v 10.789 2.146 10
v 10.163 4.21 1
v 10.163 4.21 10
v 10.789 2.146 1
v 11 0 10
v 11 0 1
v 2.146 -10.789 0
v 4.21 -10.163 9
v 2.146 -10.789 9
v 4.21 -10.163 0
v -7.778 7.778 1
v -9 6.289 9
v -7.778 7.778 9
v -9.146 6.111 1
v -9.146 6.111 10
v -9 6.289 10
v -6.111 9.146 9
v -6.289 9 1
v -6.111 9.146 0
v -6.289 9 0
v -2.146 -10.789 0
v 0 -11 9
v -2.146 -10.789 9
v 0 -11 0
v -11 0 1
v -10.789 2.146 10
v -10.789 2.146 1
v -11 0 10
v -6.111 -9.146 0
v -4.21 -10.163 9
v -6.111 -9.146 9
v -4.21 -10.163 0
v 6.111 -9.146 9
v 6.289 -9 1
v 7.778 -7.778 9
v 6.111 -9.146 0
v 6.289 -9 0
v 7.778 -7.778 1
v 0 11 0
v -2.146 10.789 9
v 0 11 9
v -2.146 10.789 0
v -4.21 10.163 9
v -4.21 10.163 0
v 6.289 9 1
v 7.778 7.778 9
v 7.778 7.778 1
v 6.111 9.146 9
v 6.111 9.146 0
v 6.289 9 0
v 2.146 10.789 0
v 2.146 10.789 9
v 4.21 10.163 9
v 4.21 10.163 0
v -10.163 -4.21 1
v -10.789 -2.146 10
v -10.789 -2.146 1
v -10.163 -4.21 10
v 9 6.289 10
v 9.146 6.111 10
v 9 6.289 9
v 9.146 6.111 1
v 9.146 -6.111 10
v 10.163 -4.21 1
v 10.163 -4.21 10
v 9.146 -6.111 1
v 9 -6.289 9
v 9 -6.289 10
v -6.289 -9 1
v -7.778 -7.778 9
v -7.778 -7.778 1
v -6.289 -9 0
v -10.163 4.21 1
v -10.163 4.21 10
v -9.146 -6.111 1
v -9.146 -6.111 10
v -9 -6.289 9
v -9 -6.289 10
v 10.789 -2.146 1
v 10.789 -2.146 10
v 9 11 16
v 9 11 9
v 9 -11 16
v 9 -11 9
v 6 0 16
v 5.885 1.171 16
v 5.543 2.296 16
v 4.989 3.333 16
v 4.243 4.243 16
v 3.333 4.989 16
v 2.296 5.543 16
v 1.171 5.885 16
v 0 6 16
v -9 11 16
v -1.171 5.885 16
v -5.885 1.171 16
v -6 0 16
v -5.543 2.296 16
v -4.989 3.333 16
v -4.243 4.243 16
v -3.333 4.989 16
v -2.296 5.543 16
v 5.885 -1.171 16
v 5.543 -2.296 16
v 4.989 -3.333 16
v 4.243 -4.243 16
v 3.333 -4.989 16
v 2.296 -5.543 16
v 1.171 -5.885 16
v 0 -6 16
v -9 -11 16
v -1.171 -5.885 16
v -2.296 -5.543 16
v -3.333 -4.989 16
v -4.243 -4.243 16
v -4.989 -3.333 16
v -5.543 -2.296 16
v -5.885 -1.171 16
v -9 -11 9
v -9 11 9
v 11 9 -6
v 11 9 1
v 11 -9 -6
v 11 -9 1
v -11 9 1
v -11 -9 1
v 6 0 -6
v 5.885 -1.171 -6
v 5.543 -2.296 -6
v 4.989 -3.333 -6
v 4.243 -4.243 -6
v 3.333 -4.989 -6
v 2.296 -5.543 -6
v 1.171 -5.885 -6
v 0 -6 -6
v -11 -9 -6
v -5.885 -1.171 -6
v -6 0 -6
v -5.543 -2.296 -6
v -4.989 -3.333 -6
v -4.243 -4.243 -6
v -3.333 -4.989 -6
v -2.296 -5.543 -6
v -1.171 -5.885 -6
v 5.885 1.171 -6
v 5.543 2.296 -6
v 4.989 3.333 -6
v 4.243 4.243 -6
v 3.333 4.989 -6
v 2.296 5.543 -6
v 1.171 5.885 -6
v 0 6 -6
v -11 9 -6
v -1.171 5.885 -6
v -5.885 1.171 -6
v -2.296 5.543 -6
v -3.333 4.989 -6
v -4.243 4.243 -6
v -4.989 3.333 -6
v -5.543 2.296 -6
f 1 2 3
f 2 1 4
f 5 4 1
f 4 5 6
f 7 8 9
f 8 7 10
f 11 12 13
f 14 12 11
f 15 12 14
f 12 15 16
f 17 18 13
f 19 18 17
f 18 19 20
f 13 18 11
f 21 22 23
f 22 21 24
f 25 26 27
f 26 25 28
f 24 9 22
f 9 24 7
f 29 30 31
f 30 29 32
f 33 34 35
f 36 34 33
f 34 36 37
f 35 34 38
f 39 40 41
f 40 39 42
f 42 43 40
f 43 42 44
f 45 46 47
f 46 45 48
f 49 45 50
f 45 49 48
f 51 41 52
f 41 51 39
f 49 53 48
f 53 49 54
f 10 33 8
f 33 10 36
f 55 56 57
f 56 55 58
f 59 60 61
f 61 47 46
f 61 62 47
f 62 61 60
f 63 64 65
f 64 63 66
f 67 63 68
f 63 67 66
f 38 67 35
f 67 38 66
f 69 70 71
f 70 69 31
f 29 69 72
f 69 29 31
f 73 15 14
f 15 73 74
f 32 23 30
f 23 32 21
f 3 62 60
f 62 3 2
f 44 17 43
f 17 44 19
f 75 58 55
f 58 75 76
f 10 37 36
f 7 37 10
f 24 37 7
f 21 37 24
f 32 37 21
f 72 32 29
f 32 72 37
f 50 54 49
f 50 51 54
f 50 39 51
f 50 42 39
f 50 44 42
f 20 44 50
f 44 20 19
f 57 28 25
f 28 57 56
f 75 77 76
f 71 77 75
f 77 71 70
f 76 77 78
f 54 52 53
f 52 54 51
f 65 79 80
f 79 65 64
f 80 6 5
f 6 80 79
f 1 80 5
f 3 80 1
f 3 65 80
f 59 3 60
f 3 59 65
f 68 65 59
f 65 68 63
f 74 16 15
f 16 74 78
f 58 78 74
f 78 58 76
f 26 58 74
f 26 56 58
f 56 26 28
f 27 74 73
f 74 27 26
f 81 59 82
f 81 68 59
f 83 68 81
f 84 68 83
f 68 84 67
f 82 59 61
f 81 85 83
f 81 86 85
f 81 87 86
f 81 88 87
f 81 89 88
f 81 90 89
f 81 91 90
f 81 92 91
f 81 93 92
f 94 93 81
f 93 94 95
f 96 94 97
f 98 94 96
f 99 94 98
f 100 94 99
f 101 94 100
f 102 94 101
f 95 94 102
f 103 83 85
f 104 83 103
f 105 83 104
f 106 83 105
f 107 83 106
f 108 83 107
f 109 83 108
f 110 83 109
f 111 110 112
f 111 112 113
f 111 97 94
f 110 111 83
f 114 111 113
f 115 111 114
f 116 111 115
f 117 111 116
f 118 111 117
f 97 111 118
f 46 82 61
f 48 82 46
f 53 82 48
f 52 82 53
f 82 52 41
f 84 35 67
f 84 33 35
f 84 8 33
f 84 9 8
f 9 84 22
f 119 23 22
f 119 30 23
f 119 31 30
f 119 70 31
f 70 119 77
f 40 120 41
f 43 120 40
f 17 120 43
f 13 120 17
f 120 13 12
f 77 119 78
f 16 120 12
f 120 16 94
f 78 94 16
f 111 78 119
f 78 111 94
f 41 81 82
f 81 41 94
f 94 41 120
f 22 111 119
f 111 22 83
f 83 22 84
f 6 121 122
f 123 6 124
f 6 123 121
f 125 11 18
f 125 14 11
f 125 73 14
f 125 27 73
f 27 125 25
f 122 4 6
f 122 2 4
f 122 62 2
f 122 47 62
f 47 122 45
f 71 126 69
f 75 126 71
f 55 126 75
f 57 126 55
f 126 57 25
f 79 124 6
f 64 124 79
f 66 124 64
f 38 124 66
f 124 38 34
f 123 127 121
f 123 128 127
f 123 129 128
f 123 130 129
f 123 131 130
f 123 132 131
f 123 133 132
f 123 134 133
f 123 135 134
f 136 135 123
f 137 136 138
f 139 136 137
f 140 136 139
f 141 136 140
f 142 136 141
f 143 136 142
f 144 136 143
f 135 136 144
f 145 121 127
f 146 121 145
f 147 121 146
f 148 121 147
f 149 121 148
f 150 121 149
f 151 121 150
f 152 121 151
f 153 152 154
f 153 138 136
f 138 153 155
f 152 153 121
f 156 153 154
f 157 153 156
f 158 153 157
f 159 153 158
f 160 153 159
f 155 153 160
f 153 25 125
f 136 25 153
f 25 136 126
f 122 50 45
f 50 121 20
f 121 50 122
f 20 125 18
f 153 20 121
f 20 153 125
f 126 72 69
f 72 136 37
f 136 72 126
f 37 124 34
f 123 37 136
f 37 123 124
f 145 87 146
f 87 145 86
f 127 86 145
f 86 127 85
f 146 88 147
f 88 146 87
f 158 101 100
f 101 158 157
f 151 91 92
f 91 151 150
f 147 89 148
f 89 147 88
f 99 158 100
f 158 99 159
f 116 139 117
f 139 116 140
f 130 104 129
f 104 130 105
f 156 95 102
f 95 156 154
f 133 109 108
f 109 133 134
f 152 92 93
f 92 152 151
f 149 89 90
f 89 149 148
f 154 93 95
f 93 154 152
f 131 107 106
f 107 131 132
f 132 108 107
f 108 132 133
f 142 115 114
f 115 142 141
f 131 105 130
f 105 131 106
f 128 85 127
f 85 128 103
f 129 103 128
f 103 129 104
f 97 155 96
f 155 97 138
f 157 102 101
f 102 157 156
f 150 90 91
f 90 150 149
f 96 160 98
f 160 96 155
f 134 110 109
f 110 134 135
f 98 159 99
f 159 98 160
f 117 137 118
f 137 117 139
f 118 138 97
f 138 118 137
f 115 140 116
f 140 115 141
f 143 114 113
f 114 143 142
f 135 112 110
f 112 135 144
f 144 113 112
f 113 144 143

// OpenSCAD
$fn = 32;

// ----------------------------------------------------------------------
// Oldham coupling disc: 22 x 22 mm
// ----------------------------------------------------------------------

// --- parameters (mm) ---
disc_d = 22;              // disc diameter
disc_t = 10;              // disc thickness
tongue_w = 18;            // tongue width
tongue_h = 6;             // tongue height
bore_d = 12;              // centre lightening bore

module disc() {
  cylinder(h = disc_t, d = disc_d);
  /* tongue on the top face, sunk 1 mm into the disc */
  translate([-tongue_w / 2, -disc_d / 2, disc_t - 1]) cube([tongue_w, disc_d, tongue_h + 1]);
  /* slot wall on the bottom face, 90 degrees turned */
  translate([-disc_d / 2, -tongue_w / 2, -tongue_h]) cube([disc_d, tongue_w, tongue_h + 1]);
}

difference() {
  disc();
  translate([0, 0, -tongue_h - 1]) cylinder(h = disc_t + 2 * tongue_h + 2, d = bore_d);
}
